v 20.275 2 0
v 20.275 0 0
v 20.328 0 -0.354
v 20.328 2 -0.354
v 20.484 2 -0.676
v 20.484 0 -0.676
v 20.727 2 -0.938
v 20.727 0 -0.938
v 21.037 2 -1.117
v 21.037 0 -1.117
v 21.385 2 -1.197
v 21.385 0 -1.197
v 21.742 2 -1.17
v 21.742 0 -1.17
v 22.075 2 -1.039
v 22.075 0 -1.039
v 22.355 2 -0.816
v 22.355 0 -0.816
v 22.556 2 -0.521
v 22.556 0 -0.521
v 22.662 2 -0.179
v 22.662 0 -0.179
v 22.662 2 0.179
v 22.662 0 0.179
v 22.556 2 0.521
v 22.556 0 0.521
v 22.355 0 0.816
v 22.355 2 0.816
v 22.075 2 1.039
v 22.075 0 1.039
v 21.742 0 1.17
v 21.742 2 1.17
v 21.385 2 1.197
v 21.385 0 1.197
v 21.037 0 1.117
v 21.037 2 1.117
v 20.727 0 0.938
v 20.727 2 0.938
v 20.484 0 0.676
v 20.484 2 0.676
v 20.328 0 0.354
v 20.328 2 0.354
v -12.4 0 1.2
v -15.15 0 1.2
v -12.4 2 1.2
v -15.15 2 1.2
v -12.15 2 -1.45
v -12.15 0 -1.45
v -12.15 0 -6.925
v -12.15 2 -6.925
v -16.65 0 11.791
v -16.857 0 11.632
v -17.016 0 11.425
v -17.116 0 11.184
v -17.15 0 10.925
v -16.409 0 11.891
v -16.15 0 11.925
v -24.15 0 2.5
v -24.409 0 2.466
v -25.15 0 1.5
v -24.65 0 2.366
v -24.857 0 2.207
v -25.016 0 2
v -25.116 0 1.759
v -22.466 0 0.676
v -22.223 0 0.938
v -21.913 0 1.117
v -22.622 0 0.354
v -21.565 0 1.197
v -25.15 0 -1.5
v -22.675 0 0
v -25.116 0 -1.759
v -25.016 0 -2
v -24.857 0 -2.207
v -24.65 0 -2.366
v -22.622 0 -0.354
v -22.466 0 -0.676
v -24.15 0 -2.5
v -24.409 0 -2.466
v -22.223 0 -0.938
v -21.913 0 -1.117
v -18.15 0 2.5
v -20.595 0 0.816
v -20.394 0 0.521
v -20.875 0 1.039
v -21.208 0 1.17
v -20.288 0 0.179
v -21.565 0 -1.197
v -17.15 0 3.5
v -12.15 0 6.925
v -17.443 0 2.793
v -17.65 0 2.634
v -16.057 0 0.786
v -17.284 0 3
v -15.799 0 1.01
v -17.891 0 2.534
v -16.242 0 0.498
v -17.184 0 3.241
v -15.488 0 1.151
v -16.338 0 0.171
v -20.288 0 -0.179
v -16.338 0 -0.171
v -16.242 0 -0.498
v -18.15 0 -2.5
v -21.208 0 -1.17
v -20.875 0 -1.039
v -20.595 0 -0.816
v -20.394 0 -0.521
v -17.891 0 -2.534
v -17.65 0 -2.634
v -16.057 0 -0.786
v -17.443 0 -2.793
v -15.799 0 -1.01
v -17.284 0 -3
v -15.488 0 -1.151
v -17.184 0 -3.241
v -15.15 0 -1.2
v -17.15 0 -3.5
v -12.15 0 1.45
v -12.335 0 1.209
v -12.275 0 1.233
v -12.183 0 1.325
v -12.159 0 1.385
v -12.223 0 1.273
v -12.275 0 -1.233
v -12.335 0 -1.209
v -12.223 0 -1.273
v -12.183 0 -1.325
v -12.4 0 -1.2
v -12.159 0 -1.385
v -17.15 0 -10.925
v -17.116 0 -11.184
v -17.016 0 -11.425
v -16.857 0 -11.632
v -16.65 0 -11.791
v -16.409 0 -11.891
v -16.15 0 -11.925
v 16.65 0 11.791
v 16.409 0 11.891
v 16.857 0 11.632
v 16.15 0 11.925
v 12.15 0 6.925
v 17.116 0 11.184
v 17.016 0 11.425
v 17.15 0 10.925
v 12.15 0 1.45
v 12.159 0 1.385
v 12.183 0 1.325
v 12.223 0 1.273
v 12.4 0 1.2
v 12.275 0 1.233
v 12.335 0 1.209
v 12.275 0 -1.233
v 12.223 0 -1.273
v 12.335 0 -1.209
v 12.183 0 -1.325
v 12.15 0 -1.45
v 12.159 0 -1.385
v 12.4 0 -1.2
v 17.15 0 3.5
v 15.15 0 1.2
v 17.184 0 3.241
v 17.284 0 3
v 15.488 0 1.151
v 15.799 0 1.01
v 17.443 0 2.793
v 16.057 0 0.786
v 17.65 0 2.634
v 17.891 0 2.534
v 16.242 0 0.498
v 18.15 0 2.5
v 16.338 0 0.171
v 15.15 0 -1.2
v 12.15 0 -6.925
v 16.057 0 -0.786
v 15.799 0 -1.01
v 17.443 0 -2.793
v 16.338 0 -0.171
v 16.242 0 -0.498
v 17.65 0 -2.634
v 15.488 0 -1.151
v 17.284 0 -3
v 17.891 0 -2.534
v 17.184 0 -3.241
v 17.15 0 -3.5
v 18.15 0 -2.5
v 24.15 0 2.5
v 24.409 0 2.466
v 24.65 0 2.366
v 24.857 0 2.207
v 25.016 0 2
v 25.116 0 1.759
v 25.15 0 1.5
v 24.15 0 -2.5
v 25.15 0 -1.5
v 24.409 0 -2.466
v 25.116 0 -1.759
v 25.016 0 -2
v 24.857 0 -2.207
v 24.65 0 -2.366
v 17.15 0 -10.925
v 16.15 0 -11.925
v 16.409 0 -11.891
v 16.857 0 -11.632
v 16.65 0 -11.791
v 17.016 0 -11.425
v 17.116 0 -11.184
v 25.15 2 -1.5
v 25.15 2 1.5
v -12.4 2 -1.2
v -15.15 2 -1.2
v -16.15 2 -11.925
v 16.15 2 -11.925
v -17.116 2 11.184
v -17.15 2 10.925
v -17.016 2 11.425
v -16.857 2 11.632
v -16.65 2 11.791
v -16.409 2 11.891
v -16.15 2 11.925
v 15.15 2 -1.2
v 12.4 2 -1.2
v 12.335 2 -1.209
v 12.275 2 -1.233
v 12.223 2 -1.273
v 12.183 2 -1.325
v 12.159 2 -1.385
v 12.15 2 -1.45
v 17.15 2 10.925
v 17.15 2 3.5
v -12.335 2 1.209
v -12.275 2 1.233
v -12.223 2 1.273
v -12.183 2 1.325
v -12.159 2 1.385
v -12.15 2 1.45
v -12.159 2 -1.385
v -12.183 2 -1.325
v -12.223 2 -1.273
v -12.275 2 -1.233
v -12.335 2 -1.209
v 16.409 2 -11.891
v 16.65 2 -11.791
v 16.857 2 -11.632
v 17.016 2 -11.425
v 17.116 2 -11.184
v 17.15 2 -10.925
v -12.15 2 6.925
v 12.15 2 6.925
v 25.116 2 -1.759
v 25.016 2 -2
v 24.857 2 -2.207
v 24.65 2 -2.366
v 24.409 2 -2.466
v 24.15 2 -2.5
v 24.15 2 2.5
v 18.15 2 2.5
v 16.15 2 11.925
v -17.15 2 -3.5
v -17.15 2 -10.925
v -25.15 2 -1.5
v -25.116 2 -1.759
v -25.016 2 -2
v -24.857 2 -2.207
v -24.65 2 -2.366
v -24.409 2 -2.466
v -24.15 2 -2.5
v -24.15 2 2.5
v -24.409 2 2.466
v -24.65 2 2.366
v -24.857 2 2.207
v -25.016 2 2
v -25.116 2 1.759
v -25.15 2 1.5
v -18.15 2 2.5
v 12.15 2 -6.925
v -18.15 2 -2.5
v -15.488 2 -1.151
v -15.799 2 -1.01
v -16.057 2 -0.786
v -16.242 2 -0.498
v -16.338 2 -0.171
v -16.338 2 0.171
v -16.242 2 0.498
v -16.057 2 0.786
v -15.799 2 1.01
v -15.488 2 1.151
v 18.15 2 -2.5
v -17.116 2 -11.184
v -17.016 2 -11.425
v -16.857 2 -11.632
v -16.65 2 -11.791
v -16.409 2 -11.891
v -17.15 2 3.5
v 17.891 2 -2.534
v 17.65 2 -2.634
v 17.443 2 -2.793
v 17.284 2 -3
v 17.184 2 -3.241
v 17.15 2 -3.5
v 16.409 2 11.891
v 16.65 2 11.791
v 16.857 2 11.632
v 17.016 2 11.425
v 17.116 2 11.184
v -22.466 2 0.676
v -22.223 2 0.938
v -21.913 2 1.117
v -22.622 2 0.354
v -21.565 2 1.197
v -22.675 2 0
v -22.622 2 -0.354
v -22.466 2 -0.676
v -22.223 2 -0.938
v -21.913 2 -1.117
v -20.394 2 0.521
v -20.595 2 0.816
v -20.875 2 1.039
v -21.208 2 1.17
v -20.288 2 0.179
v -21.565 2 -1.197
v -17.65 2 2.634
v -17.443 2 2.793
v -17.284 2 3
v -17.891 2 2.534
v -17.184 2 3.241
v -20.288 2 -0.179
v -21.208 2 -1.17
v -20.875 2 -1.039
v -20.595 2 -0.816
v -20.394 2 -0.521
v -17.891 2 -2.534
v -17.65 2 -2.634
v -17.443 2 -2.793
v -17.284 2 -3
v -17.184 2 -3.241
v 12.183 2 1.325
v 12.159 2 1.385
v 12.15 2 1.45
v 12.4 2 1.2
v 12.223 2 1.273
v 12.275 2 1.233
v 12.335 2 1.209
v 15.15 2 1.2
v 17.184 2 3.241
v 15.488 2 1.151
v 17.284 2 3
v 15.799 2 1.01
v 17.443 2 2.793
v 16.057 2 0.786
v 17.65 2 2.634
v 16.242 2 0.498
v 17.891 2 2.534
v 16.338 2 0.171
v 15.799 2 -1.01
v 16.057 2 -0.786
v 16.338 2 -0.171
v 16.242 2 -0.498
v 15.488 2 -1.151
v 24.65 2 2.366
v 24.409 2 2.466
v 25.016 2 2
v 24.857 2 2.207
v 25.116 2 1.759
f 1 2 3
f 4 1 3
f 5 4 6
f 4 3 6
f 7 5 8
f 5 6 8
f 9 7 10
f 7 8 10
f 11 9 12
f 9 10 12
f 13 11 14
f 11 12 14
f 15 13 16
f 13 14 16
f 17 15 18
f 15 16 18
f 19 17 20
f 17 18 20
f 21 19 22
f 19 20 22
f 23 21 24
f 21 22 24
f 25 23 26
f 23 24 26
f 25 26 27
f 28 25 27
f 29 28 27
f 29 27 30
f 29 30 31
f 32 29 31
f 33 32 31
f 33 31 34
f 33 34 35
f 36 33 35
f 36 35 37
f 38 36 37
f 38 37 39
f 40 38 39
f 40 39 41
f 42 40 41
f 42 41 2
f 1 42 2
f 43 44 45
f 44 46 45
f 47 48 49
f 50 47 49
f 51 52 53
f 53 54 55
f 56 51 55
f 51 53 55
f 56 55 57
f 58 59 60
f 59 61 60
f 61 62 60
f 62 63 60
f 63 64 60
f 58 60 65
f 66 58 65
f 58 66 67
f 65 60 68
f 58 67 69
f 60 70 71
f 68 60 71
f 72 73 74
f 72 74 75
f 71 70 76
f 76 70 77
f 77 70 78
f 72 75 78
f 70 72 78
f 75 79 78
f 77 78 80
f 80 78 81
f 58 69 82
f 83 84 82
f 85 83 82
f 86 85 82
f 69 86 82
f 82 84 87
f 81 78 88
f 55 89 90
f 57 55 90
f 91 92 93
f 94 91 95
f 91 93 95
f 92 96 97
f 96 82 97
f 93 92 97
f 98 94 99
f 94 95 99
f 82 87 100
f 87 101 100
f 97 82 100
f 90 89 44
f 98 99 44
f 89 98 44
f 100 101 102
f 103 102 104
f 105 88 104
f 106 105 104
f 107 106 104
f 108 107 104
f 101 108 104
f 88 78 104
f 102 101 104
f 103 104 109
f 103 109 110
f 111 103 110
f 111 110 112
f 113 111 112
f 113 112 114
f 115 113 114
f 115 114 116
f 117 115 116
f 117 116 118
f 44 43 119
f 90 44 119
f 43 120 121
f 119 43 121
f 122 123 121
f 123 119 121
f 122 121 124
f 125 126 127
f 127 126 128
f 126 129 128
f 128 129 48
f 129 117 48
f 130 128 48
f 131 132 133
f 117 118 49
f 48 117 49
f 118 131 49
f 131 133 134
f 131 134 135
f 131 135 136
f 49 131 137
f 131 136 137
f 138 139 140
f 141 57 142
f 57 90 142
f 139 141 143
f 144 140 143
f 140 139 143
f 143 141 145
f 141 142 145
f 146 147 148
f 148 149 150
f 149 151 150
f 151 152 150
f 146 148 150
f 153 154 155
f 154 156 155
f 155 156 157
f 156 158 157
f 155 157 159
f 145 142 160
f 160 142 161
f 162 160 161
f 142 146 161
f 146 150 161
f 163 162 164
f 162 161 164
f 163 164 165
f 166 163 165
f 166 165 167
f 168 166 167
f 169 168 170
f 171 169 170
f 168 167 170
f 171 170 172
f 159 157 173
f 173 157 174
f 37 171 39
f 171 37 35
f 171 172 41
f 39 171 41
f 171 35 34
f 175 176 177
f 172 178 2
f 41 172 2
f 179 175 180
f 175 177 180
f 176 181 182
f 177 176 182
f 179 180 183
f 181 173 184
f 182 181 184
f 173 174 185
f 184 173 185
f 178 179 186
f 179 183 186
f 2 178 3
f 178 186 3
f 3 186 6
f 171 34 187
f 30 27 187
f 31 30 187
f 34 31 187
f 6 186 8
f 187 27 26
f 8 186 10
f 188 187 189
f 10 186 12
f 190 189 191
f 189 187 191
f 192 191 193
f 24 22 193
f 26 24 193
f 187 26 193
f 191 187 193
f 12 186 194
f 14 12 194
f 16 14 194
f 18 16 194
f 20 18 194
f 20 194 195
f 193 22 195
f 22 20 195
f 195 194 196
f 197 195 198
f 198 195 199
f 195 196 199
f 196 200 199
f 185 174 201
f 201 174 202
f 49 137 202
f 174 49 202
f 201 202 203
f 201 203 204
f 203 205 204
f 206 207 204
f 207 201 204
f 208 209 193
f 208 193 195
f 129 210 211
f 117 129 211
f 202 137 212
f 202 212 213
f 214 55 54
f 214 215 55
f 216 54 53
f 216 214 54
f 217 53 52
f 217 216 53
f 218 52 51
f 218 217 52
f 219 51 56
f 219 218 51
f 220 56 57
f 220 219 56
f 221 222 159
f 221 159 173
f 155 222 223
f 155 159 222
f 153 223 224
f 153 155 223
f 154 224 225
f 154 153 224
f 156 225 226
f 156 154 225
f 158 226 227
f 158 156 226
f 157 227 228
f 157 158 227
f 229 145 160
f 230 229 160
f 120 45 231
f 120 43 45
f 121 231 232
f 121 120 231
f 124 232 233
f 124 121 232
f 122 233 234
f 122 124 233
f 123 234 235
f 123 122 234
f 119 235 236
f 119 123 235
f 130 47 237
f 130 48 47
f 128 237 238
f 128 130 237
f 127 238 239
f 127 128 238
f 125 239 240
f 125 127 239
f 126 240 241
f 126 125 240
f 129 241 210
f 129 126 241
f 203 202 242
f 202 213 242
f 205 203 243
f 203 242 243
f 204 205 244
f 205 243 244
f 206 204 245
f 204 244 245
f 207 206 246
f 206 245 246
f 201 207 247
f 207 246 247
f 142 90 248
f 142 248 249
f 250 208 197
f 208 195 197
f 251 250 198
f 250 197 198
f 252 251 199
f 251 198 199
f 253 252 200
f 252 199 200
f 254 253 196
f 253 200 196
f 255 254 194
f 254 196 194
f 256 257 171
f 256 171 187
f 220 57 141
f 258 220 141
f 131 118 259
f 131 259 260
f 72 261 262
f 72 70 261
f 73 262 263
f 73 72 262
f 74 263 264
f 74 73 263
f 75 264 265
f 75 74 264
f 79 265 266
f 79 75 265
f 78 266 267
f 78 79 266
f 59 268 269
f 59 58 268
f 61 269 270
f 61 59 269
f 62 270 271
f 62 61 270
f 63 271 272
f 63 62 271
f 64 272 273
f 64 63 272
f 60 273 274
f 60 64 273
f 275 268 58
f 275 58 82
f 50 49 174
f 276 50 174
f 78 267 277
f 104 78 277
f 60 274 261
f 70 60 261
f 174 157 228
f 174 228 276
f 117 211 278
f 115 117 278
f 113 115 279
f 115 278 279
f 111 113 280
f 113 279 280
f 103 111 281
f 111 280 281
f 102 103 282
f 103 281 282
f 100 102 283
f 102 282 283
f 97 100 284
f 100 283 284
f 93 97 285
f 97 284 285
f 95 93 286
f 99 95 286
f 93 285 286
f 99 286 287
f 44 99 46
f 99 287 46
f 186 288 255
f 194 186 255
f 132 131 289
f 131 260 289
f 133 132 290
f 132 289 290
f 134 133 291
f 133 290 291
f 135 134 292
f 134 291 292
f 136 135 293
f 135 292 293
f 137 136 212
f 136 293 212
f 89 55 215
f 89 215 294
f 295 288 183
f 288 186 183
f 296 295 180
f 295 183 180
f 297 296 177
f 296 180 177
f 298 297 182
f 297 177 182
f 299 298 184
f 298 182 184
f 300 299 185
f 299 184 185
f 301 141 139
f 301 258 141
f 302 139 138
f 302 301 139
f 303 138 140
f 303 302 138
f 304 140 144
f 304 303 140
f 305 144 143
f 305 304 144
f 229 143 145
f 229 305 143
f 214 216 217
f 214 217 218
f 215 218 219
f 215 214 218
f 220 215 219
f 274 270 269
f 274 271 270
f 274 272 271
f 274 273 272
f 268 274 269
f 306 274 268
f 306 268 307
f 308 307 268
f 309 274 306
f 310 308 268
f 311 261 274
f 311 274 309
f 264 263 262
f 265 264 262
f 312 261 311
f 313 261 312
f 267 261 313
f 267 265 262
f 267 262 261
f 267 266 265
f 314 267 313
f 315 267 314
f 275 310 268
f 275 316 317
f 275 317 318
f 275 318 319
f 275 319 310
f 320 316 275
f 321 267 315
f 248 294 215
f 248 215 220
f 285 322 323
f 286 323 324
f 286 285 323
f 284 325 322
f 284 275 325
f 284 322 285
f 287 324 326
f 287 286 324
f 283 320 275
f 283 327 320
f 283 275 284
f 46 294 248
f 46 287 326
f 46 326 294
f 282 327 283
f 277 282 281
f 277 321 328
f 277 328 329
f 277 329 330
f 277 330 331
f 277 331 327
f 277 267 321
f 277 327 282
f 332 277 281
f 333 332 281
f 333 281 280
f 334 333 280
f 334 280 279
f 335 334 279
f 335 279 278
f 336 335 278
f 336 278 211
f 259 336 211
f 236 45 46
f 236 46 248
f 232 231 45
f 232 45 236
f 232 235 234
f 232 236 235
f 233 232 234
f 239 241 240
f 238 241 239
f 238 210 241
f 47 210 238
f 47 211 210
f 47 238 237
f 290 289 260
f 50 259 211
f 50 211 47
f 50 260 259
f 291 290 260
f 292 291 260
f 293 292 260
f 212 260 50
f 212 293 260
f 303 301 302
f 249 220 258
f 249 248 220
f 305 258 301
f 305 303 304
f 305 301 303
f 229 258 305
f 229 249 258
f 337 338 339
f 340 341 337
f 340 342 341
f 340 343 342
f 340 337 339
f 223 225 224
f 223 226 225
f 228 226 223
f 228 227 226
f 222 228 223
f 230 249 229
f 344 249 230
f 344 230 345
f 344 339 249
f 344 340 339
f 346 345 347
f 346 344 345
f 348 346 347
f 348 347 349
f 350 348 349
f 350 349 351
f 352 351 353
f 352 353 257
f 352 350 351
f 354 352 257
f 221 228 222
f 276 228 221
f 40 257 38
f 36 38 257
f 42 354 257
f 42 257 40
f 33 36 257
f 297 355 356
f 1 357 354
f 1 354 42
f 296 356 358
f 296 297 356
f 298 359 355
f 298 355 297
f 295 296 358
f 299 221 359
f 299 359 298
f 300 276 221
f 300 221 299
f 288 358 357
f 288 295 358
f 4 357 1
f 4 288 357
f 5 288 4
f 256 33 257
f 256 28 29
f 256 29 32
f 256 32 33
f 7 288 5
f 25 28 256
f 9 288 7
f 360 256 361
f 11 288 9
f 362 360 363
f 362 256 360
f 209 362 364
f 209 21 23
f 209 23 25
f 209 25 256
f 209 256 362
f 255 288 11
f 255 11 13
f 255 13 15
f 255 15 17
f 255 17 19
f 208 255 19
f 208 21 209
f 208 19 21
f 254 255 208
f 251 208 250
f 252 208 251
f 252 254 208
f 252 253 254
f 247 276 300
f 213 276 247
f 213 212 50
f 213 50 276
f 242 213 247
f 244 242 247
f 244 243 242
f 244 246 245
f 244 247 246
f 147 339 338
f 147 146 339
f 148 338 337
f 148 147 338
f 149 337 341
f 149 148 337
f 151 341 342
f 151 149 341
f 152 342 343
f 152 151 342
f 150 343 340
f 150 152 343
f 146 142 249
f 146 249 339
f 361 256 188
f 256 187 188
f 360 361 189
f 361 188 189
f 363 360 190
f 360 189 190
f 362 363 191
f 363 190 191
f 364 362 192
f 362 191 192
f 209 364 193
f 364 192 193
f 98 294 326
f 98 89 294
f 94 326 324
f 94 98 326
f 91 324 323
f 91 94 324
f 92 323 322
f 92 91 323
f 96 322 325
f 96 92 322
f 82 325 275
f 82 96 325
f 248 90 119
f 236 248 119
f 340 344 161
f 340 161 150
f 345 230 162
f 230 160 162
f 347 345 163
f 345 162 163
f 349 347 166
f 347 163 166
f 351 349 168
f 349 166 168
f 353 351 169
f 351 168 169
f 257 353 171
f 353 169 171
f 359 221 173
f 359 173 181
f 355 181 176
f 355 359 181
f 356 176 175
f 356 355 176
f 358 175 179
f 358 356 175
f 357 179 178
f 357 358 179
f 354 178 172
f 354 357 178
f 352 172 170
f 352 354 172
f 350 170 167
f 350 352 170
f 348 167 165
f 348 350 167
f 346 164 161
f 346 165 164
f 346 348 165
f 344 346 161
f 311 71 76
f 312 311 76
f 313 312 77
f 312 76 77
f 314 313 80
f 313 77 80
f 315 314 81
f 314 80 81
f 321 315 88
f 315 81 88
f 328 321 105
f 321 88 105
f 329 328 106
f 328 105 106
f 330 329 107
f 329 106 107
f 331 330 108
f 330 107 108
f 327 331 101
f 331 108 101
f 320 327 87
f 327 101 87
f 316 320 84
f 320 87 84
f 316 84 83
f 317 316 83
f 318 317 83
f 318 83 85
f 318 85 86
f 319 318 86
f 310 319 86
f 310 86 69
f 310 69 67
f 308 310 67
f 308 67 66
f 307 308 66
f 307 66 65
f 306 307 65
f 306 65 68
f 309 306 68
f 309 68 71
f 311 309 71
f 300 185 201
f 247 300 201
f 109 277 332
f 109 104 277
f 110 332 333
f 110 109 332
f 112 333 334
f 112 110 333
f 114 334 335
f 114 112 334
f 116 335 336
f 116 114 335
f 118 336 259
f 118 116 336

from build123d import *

# Parameters (mm, degrees)
SKETCH1_W            = 34.3
SKETCH1_H            = 23.85
SKETCH1_W_2          = 24.3
SKETCH1_H_2          = 13.85
BOSS_EXTRUDE1_DEPTH  = 2
SKETCH4_W            = 8
SKETCH4_H            = 5
BOSS_EXTRUDE2_DEPTH  = 2
M2_CLEARANCE_HOLE1_D = 2.4
FILLET1_R            = 1
CUT_EXTRUDE1_DEPTH   = 3
FILLET2_R            = 0.25


with BuildPart() as part:
    # Sketch1 → Boss-Extrude1 (new body)
    with BuildSketch(Plane(origin=(0, 0, 0), x_dir=(1, 0, 0), z_dir=(0, 1, 0))):
        Rectangle(SKETCH1_W, SKETCH1_H)
        Rectangle(SKETCH1_W_2, SKETCH1_H_2, mode=Mode.SUBTRACT)
    extrude(amount=BOSS_EXTRUDE1_DEPTH)

    # Sketch4 → Boss-Extrude2 (add)
    with BuildSketch(Plane(origin=(0, 2, 0), x_dir=(1, 0, 0), z_dir=(0, 1, 0))):
        with Locations((-21.15, 0)):
            Rectangle(SKETCH4_W, SKETCH4_H)
        with Locations((21.15, 0)):
            Rectangle(SKETCH4_W, SKETCH4_H)
    extrude(amount=-BOSS_EXTRUDE2_DEPTH)

    # M2 Clearance Hole1 (through all)
    with Locations(Plane(origin=(0, 2, 0), x_dir=(1, 0, 0), z_dir=(0, 1, 0))):
        with Locations((-13.975, 0), (13.975, 0), (-21.475, 0), (21.475, 0)):
            Hole(M2_CLEARANCE_HOLE1_D / 2)

    # Fillet1
    fillet1_edges = [part.edges().sort_by_distance(p)[0] for p in [
        (-17.15, 1, -2.5),
        (-17.15, 1, 2.5),
        (-25.15, 1, 2.5),
        (-25.15, 1, -2.5),
        (17.15, 1, 2.5),
        (17.15, 1, -2.5),
        (25.15, 1, -2.5),
        (25.15, 1, 2.5),
        (-17.15, 1, -11.925),
        (17.15, 1, -11.925),
        (17.15, 1, 11.925),
        (-17.15, 1, 11.925),
    ]]
    fillet(fillet1_edges, radius=FILLET1_R)

    # Sketch5 → Cut-Extrude1 (cut, through all)
    with BuildSketch(Plane(origin=(0, 2, 0), x_dir=(1, 0, 0), z_dir=(0, 1, 0))):
        with BuildLine():
            Line((-12.15, 1.2), (-15.15, 1.2))
            ThreePointArc((-15.15, 1.2), (-16.35, 0), (-15.15, -1.2))
            Line((-15.15, -1.2), (-12.15, -1.2))
            Line((-12.15, -1.2), (-12.15, 1.2))
        make_face()
        with BuildLine():
            Line((12.15, 1.2), (15.15, 1.2))
            ThreePointArc((15.15, 1.2), (16.35, 0), (15.15, -1.2))
            Line((15.15, -1.2), (12.15, -1.2))
            Line((12.15, -1.2), (12.15, 1.2))
        make_face()
    extrude(amount=-CUT_EXTRUDE1_DEPTH, mode=Mode.SUBTRACT)

    # Fillet2
    fillet2_edges = [part.edges().sort_by_distance(p)[0] for p in [
        (-12.15, 1, 1.2),
        (-12.15, 1, -1.2),
        (12.15, 1, -1.2),
        (12.15, 1, 1.2),
    ]]
    fillet(fillet2_edges, radius=FILLET2_R)


solid = part.part
